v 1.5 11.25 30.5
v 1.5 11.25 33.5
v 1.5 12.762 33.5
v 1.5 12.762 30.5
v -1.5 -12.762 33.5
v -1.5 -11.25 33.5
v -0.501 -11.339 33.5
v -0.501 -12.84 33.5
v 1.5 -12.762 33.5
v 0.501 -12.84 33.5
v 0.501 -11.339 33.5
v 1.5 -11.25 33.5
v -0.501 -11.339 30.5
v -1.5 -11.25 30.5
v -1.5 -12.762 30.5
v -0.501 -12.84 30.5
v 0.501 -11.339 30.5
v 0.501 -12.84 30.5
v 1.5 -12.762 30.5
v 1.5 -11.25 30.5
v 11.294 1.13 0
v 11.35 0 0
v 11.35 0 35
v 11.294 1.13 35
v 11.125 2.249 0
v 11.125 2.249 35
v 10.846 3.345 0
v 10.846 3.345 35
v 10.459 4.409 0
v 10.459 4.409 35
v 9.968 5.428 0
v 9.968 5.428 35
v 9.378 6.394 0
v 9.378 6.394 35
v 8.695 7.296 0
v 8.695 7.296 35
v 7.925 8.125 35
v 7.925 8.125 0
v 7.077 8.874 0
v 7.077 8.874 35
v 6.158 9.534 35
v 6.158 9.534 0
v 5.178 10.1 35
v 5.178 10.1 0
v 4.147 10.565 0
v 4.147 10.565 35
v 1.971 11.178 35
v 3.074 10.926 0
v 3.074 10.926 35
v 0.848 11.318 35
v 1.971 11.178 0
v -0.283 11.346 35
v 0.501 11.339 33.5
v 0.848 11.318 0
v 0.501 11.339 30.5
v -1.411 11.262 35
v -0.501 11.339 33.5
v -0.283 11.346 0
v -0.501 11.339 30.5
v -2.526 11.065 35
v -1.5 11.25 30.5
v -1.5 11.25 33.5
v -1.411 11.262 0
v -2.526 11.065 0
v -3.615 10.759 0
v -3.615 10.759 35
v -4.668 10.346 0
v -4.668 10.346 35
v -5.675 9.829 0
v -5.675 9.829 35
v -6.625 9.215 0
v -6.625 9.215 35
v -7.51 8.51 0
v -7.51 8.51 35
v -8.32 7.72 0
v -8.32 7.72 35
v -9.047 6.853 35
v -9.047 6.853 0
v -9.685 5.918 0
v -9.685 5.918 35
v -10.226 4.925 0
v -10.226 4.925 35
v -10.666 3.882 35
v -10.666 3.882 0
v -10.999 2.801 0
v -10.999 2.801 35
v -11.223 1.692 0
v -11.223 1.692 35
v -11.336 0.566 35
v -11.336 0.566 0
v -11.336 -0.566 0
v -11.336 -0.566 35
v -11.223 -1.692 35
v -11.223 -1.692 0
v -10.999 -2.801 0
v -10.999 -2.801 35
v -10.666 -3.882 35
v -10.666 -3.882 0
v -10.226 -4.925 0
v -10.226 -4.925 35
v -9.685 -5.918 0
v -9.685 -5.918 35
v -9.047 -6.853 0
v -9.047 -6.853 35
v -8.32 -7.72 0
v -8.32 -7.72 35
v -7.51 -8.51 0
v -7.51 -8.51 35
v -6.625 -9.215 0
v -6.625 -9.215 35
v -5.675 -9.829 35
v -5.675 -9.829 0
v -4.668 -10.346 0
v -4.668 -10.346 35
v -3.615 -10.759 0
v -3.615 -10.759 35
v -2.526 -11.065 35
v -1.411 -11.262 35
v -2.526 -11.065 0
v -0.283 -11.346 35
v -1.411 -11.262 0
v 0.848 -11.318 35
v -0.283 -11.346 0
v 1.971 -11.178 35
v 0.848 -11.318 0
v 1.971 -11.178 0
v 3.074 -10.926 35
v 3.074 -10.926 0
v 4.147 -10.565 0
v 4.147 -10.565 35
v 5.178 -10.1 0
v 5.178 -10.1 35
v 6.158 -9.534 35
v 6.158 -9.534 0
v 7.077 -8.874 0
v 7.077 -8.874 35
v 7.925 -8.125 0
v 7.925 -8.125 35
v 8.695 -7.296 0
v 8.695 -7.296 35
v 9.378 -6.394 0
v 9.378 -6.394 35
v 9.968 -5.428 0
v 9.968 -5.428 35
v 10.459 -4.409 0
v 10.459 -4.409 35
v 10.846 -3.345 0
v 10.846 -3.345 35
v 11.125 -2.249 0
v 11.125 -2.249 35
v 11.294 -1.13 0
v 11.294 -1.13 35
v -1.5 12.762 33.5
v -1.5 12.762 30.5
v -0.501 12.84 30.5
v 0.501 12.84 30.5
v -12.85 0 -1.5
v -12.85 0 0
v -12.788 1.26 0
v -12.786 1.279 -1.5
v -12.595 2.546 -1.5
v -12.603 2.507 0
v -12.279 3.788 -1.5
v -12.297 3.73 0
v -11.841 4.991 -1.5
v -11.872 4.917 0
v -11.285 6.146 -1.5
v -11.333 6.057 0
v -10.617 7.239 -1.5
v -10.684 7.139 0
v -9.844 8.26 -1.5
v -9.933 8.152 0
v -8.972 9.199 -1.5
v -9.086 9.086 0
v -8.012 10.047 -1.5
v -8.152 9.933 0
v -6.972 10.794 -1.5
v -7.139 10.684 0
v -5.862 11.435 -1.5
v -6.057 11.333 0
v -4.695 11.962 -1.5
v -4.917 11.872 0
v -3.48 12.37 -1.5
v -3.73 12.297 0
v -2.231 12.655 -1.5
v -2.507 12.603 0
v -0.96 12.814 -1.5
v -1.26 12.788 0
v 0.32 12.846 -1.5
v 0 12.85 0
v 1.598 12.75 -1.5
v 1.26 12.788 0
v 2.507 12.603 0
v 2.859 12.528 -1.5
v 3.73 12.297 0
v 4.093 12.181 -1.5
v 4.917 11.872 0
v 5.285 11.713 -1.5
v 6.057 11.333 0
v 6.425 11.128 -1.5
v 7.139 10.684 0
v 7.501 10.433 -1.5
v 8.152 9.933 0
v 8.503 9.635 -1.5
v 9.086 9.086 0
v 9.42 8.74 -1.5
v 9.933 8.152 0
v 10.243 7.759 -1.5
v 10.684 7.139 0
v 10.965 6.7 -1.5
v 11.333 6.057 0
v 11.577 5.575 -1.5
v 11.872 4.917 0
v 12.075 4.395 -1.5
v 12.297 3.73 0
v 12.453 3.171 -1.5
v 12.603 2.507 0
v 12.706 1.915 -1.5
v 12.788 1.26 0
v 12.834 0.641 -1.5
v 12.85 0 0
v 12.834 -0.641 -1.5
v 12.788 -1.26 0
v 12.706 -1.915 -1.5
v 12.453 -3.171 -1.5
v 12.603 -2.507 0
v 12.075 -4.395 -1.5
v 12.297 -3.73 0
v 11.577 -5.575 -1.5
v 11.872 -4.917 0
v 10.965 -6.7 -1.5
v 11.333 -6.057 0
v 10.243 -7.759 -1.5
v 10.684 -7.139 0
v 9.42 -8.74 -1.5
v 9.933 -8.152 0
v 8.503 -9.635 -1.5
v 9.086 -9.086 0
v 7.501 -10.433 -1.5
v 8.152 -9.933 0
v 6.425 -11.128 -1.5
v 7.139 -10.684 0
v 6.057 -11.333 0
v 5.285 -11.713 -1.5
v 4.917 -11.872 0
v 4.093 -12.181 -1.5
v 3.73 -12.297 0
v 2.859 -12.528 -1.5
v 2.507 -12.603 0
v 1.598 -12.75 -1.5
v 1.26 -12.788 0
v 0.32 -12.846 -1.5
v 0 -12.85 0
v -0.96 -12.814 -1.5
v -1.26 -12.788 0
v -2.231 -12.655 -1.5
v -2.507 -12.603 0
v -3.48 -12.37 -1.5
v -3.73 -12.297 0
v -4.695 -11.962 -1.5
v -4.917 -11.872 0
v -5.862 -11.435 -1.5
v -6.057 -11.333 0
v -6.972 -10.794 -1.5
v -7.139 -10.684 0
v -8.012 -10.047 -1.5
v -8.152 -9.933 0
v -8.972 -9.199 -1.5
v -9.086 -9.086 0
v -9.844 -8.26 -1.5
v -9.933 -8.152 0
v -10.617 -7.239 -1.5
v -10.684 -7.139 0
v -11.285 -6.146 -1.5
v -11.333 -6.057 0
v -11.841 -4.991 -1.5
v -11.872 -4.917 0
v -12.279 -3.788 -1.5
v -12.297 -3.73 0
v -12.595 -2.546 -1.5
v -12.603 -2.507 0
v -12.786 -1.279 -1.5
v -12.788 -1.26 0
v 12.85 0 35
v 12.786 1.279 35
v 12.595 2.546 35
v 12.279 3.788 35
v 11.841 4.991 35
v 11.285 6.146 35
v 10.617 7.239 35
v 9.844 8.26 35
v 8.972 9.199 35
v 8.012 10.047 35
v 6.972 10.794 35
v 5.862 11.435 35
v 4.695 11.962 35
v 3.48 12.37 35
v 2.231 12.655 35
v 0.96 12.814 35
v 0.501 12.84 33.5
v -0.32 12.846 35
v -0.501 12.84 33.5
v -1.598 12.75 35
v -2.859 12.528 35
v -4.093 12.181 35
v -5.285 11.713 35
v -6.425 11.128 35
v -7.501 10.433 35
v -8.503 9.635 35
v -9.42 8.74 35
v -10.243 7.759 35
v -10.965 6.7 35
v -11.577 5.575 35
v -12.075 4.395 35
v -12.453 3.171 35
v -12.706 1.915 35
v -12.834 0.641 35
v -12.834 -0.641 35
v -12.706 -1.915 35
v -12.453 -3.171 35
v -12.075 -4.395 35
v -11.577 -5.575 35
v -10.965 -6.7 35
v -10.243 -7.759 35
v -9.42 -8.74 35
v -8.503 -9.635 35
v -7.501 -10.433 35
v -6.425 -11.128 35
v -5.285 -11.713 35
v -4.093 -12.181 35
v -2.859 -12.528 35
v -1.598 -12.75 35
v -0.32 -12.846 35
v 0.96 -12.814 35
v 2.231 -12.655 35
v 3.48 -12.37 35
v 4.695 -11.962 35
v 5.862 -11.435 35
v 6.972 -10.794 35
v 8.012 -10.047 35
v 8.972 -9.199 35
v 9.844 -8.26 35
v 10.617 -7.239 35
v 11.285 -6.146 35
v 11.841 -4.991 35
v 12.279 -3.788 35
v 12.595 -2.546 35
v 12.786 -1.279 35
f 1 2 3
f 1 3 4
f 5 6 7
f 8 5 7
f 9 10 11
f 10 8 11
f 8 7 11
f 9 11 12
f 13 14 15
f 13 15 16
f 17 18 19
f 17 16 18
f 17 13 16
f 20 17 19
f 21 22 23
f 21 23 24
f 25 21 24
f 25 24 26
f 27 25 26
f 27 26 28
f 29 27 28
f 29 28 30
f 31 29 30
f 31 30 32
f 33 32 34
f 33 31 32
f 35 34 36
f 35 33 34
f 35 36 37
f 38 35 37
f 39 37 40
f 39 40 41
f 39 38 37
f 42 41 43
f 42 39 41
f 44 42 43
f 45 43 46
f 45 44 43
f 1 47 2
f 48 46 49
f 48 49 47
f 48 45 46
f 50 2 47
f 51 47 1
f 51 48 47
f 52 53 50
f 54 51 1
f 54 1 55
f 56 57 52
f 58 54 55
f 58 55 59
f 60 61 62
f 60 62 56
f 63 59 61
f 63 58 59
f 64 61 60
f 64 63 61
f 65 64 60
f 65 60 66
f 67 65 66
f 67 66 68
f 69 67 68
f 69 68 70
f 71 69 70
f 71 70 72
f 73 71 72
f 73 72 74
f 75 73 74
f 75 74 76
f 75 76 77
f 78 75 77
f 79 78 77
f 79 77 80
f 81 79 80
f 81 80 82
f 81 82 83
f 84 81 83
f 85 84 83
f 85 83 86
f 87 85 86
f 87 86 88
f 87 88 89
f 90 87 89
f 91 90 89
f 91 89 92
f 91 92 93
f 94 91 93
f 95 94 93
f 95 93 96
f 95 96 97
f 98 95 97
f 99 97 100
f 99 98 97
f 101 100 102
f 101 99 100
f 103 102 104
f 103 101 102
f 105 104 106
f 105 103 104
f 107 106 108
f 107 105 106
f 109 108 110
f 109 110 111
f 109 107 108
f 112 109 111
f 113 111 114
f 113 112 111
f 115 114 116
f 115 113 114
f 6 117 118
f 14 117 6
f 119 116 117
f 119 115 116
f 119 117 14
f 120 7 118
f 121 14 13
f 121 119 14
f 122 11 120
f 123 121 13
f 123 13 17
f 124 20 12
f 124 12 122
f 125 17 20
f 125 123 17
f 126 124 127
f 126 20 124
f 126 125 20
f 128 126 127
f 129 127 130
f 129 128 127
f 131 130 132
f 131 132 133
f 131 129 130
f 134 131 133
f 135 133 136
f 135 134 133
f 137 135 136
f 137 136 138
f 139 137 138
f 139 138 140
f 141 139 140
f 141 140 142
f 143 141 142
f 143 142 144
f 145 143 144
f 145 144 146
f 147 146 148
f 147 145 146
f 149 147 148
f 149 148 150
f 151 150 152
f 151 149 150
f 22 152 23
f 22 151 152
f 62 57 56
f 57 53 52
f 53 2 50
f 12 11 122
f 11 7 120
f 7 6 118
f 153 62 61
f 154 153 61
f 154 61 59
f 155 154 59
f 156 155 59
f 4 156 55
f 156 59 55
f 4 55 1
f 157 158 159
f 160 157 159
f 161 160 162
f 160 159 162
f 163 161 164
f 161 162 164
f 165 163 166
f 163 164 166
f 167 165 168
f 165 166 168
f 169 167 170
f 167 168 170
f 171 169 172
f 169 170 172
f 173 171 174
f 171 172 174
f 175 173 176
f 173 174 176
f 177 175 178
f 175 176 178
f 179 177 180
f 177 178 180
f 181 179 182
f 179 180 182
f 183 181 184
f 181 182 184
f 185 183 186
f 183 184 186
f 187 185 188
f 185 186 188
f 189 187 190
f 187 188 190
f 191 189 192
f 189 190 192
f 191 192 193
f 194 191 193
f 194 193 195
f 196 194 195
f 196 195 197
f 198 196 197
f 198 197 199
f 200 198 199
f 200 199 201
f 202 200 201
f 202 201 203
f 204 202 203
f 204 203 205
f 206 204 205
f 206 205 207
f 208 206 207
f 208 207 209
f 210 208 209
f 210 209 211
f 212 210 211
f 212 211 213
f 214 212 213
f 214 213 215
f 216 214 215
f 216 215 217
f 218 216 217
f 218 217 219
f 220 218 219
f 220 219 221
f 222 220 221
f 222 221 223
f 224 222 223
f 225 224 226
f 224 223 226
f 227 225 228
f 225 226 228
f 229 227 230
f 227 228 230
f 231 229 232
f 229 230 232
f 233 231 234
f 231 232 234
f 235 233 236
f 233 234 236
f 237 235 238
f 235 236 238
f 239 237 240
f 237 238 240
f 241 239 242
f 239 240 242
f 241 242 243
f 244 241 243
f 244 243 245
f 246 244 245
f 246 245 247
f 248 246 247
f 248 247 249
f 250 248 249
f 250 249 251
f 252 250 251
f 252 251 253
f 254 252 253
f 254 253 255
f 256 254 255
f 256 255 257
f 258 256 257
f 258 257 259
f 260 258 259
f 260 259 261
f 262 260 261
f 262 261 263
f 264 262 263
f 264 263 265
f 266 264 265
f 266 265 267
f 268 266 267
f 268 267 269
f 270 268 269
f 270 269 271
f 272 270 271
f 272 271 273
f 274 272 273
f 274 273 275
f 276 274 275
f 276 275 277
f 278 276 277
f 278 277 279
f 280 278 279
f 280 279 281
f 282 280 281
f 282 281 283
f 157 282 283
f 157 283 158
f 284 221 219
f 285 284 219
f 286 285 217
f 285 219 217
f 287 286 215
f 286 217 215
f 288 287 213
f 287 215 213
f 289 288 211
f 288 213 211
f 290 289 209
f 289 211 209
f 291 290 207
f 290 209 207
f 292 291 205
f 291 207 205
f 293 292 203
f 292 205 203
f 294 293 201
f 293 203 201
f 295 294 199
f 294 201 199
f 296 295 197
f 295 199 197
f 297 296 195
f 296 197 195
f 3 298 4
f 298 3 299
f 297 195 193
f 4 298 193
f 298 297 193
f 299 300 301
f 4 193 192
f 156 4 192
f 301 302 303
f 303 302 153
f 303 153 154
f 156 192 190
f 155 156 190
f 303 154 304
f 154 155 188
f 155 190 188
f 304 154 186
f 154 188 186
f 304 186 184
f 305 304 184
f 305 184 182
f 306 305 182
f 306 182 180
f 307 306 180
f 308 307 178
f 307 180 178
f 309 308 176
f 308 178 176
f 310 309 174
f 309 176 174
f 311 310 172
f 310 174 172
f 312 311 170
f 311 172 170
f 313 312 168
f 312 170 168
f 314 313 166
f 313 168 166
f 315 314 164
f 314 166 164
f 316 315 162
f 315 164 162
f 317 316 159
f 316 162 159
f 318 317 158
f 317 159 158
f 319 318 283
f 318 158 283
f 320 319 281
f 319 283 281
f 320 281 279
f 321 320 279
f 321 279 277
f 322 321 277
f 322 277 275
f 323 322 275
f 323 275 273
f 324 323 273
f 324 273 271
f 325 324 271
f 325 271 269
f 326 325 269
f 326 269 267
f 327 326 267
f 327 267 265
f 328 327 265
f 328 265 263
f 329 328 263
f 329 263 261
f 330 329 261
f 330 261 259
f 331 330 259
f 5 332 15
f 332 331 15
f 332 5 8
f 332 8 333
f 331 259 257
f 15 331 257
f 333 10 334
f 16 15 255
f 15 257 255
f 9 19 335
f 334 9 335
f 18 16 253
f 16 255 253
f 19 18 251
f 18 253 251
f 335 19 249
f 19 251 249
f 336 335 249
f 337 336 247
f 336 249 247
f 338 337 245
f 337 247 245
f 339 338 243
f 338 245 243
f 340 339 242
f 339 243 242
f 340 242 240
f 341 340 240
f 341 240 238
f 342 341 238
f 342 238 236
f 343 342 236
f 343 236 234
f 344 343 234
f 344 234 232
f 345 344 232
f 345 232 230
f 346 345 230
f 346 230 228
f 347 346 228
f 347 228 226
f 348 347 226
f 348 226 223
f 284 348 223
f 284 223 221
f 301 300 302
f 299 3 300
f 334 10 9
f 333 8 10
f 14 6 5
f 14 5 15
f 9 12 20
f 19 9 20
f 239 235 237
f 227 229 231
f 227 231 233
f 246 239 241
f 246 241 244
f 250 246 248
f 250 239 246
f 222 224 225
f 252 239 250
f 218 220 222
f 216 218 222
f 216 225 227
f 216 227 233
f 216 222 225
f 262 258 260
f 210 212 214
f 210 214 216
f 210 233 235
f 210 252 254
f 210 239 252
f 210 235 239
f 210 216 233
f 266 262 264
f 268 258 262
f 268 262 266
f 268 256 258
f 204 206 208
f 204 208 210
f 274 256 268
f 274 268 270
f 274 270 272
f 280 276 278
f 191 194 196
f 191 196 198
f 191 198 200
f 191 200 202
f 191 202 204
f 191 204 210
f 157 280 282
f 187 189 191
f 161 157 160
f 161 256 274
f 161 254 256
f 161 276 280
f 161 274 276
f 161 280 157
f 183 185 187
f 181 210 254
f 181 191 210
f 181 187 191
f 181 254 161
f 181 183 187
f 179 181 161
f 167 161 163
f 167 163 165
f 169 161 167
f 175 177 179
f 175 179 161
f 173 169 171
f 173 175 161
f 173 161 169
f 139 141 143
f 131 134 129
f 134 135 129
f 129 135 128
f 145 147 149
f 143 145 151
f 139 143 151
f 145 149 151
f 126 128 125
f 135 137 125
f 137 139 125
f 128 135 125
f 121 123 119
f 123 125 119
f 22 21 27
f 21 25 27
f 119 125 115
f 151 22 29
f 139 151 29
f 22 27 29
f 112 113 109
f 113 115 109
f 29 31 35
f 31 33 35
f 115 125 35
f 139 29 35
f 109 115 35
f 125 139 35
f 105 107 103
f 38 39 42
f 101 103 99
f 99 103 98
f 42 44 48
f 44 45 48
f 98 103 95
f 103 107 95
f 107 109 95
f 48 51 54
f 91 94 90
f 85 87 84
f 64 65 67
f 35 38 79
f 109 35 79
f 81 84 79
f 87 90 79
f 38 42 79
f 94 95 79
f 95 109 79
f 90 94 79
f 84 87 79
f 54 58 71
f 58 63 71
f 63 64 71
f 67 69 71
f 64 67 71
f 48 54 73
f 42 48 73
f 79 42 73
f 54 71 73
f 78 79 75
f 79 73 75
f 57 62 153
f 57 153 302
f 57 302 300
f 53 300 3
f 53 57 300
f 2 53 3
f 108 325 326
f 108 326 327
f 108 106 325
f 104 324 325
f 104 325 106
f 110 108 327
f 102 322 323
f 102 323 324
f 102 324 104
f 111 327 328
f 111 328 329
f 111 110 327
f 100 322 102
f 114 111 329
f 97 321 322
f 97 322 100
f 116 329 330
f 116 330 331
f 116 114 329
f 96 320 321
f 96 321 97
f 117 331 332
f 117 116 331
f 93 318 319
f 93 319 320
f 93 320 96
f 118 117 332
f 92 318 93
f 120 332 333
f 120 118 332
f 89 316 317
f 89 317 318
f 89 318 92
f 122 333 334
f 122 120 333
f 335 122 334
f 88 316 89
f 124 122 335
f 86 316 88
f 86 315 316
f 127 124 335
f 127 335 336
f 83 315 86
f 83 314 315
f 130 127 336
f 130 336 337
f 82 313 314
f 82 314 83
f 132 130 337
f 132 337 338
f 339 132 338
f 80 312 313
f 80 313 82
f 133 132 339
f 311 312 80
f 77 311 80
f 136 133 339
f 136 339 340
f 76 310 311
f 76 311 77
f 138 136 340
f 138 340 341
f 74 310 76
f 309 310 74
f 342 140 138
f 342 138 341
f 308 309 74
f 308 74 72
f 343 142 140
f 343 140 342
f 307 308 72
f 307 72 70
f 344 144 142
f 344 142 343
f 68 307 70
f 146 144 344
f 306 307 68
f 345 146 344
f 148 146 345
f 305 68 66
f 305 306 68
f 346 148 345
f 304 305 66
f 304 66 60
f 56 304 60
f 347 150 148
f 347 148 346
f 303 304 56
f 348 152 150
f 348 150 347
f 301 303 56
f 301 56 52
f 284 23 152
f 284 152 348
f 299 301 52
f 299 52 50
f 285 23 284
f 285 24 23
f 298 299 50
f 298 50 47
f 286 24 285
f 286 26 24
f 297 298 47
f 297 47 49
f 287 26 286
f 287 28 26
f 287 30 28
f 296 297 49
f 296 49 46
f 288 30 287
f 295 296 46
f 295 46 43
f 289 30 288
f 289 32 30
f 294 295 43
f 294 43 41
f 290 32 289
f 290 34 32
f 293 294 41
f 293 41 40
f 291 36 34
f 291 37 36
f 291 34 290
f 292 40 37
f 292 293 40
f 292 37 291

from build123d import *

# Parameters (mm, degrees)
ESBO_O1_R                  = 12.85
ESBO_O1_R_2                = 11.35
RESSALTO_EXTRUS_O1_DEPTH   = 35
ESBO_O2_R                  = 12.85
RESSALTO_EXTRUS_O2_DEPTH   = 1.5
ESBO_O3_W                  = 3
ESBO_O3_H                  = 3
CORTE_EXTRUS_O1_DEPTH      = 13.85
CORTE_EXTRUS_O1_DEPTH_BACK = 13.85


with BuildPart() as part:
    # Esboço1 → Ressalto-extrusão1 (new body)
    with BuildSketch(Plane.XY):
        Circle(ESBO_O1_R)
        Circle(ESBO_O1_R_2, mode=Mode.SUBTRACT)
    extrude(amount=RESSALTO_EXTRUS_O1_DEPTH)

    # Esboço2 → Ressalto-extrusão2 (add)
    with BuildSketch(Plane(origin=(0, 0, 0), x_dir=(-1, 0, 0), z_dir=(0, 0, -1))):
        Circle(ESBO_O2_R)
    extrude(amount=RESSALTO_EXTRUS_O2_DEPTH)

    # Esboço3 → Corte-extrusão1 (cut, two sides)
    with BuildSketch(Plane(origin=(0, 0, 0), x_dir=(1, 0, 0), z_dir=(0, 1, 0))) as corte_extrus_o1_sk:
        with Locations((0, -32)):
            Rectangle(ESBO_O3_W, ESBO_O3_H)
    extrude(amount=CORTE_EXTRUS_O1_DEPTH, mode=Mode.SUBTRACT)
    extrude(corte_extrus_o1_sk.sketch, amount=-CORTE_EXTRUS_O1_DEPTH_BACK, mode=Mode.SUBTRACT)


solid = part.part
